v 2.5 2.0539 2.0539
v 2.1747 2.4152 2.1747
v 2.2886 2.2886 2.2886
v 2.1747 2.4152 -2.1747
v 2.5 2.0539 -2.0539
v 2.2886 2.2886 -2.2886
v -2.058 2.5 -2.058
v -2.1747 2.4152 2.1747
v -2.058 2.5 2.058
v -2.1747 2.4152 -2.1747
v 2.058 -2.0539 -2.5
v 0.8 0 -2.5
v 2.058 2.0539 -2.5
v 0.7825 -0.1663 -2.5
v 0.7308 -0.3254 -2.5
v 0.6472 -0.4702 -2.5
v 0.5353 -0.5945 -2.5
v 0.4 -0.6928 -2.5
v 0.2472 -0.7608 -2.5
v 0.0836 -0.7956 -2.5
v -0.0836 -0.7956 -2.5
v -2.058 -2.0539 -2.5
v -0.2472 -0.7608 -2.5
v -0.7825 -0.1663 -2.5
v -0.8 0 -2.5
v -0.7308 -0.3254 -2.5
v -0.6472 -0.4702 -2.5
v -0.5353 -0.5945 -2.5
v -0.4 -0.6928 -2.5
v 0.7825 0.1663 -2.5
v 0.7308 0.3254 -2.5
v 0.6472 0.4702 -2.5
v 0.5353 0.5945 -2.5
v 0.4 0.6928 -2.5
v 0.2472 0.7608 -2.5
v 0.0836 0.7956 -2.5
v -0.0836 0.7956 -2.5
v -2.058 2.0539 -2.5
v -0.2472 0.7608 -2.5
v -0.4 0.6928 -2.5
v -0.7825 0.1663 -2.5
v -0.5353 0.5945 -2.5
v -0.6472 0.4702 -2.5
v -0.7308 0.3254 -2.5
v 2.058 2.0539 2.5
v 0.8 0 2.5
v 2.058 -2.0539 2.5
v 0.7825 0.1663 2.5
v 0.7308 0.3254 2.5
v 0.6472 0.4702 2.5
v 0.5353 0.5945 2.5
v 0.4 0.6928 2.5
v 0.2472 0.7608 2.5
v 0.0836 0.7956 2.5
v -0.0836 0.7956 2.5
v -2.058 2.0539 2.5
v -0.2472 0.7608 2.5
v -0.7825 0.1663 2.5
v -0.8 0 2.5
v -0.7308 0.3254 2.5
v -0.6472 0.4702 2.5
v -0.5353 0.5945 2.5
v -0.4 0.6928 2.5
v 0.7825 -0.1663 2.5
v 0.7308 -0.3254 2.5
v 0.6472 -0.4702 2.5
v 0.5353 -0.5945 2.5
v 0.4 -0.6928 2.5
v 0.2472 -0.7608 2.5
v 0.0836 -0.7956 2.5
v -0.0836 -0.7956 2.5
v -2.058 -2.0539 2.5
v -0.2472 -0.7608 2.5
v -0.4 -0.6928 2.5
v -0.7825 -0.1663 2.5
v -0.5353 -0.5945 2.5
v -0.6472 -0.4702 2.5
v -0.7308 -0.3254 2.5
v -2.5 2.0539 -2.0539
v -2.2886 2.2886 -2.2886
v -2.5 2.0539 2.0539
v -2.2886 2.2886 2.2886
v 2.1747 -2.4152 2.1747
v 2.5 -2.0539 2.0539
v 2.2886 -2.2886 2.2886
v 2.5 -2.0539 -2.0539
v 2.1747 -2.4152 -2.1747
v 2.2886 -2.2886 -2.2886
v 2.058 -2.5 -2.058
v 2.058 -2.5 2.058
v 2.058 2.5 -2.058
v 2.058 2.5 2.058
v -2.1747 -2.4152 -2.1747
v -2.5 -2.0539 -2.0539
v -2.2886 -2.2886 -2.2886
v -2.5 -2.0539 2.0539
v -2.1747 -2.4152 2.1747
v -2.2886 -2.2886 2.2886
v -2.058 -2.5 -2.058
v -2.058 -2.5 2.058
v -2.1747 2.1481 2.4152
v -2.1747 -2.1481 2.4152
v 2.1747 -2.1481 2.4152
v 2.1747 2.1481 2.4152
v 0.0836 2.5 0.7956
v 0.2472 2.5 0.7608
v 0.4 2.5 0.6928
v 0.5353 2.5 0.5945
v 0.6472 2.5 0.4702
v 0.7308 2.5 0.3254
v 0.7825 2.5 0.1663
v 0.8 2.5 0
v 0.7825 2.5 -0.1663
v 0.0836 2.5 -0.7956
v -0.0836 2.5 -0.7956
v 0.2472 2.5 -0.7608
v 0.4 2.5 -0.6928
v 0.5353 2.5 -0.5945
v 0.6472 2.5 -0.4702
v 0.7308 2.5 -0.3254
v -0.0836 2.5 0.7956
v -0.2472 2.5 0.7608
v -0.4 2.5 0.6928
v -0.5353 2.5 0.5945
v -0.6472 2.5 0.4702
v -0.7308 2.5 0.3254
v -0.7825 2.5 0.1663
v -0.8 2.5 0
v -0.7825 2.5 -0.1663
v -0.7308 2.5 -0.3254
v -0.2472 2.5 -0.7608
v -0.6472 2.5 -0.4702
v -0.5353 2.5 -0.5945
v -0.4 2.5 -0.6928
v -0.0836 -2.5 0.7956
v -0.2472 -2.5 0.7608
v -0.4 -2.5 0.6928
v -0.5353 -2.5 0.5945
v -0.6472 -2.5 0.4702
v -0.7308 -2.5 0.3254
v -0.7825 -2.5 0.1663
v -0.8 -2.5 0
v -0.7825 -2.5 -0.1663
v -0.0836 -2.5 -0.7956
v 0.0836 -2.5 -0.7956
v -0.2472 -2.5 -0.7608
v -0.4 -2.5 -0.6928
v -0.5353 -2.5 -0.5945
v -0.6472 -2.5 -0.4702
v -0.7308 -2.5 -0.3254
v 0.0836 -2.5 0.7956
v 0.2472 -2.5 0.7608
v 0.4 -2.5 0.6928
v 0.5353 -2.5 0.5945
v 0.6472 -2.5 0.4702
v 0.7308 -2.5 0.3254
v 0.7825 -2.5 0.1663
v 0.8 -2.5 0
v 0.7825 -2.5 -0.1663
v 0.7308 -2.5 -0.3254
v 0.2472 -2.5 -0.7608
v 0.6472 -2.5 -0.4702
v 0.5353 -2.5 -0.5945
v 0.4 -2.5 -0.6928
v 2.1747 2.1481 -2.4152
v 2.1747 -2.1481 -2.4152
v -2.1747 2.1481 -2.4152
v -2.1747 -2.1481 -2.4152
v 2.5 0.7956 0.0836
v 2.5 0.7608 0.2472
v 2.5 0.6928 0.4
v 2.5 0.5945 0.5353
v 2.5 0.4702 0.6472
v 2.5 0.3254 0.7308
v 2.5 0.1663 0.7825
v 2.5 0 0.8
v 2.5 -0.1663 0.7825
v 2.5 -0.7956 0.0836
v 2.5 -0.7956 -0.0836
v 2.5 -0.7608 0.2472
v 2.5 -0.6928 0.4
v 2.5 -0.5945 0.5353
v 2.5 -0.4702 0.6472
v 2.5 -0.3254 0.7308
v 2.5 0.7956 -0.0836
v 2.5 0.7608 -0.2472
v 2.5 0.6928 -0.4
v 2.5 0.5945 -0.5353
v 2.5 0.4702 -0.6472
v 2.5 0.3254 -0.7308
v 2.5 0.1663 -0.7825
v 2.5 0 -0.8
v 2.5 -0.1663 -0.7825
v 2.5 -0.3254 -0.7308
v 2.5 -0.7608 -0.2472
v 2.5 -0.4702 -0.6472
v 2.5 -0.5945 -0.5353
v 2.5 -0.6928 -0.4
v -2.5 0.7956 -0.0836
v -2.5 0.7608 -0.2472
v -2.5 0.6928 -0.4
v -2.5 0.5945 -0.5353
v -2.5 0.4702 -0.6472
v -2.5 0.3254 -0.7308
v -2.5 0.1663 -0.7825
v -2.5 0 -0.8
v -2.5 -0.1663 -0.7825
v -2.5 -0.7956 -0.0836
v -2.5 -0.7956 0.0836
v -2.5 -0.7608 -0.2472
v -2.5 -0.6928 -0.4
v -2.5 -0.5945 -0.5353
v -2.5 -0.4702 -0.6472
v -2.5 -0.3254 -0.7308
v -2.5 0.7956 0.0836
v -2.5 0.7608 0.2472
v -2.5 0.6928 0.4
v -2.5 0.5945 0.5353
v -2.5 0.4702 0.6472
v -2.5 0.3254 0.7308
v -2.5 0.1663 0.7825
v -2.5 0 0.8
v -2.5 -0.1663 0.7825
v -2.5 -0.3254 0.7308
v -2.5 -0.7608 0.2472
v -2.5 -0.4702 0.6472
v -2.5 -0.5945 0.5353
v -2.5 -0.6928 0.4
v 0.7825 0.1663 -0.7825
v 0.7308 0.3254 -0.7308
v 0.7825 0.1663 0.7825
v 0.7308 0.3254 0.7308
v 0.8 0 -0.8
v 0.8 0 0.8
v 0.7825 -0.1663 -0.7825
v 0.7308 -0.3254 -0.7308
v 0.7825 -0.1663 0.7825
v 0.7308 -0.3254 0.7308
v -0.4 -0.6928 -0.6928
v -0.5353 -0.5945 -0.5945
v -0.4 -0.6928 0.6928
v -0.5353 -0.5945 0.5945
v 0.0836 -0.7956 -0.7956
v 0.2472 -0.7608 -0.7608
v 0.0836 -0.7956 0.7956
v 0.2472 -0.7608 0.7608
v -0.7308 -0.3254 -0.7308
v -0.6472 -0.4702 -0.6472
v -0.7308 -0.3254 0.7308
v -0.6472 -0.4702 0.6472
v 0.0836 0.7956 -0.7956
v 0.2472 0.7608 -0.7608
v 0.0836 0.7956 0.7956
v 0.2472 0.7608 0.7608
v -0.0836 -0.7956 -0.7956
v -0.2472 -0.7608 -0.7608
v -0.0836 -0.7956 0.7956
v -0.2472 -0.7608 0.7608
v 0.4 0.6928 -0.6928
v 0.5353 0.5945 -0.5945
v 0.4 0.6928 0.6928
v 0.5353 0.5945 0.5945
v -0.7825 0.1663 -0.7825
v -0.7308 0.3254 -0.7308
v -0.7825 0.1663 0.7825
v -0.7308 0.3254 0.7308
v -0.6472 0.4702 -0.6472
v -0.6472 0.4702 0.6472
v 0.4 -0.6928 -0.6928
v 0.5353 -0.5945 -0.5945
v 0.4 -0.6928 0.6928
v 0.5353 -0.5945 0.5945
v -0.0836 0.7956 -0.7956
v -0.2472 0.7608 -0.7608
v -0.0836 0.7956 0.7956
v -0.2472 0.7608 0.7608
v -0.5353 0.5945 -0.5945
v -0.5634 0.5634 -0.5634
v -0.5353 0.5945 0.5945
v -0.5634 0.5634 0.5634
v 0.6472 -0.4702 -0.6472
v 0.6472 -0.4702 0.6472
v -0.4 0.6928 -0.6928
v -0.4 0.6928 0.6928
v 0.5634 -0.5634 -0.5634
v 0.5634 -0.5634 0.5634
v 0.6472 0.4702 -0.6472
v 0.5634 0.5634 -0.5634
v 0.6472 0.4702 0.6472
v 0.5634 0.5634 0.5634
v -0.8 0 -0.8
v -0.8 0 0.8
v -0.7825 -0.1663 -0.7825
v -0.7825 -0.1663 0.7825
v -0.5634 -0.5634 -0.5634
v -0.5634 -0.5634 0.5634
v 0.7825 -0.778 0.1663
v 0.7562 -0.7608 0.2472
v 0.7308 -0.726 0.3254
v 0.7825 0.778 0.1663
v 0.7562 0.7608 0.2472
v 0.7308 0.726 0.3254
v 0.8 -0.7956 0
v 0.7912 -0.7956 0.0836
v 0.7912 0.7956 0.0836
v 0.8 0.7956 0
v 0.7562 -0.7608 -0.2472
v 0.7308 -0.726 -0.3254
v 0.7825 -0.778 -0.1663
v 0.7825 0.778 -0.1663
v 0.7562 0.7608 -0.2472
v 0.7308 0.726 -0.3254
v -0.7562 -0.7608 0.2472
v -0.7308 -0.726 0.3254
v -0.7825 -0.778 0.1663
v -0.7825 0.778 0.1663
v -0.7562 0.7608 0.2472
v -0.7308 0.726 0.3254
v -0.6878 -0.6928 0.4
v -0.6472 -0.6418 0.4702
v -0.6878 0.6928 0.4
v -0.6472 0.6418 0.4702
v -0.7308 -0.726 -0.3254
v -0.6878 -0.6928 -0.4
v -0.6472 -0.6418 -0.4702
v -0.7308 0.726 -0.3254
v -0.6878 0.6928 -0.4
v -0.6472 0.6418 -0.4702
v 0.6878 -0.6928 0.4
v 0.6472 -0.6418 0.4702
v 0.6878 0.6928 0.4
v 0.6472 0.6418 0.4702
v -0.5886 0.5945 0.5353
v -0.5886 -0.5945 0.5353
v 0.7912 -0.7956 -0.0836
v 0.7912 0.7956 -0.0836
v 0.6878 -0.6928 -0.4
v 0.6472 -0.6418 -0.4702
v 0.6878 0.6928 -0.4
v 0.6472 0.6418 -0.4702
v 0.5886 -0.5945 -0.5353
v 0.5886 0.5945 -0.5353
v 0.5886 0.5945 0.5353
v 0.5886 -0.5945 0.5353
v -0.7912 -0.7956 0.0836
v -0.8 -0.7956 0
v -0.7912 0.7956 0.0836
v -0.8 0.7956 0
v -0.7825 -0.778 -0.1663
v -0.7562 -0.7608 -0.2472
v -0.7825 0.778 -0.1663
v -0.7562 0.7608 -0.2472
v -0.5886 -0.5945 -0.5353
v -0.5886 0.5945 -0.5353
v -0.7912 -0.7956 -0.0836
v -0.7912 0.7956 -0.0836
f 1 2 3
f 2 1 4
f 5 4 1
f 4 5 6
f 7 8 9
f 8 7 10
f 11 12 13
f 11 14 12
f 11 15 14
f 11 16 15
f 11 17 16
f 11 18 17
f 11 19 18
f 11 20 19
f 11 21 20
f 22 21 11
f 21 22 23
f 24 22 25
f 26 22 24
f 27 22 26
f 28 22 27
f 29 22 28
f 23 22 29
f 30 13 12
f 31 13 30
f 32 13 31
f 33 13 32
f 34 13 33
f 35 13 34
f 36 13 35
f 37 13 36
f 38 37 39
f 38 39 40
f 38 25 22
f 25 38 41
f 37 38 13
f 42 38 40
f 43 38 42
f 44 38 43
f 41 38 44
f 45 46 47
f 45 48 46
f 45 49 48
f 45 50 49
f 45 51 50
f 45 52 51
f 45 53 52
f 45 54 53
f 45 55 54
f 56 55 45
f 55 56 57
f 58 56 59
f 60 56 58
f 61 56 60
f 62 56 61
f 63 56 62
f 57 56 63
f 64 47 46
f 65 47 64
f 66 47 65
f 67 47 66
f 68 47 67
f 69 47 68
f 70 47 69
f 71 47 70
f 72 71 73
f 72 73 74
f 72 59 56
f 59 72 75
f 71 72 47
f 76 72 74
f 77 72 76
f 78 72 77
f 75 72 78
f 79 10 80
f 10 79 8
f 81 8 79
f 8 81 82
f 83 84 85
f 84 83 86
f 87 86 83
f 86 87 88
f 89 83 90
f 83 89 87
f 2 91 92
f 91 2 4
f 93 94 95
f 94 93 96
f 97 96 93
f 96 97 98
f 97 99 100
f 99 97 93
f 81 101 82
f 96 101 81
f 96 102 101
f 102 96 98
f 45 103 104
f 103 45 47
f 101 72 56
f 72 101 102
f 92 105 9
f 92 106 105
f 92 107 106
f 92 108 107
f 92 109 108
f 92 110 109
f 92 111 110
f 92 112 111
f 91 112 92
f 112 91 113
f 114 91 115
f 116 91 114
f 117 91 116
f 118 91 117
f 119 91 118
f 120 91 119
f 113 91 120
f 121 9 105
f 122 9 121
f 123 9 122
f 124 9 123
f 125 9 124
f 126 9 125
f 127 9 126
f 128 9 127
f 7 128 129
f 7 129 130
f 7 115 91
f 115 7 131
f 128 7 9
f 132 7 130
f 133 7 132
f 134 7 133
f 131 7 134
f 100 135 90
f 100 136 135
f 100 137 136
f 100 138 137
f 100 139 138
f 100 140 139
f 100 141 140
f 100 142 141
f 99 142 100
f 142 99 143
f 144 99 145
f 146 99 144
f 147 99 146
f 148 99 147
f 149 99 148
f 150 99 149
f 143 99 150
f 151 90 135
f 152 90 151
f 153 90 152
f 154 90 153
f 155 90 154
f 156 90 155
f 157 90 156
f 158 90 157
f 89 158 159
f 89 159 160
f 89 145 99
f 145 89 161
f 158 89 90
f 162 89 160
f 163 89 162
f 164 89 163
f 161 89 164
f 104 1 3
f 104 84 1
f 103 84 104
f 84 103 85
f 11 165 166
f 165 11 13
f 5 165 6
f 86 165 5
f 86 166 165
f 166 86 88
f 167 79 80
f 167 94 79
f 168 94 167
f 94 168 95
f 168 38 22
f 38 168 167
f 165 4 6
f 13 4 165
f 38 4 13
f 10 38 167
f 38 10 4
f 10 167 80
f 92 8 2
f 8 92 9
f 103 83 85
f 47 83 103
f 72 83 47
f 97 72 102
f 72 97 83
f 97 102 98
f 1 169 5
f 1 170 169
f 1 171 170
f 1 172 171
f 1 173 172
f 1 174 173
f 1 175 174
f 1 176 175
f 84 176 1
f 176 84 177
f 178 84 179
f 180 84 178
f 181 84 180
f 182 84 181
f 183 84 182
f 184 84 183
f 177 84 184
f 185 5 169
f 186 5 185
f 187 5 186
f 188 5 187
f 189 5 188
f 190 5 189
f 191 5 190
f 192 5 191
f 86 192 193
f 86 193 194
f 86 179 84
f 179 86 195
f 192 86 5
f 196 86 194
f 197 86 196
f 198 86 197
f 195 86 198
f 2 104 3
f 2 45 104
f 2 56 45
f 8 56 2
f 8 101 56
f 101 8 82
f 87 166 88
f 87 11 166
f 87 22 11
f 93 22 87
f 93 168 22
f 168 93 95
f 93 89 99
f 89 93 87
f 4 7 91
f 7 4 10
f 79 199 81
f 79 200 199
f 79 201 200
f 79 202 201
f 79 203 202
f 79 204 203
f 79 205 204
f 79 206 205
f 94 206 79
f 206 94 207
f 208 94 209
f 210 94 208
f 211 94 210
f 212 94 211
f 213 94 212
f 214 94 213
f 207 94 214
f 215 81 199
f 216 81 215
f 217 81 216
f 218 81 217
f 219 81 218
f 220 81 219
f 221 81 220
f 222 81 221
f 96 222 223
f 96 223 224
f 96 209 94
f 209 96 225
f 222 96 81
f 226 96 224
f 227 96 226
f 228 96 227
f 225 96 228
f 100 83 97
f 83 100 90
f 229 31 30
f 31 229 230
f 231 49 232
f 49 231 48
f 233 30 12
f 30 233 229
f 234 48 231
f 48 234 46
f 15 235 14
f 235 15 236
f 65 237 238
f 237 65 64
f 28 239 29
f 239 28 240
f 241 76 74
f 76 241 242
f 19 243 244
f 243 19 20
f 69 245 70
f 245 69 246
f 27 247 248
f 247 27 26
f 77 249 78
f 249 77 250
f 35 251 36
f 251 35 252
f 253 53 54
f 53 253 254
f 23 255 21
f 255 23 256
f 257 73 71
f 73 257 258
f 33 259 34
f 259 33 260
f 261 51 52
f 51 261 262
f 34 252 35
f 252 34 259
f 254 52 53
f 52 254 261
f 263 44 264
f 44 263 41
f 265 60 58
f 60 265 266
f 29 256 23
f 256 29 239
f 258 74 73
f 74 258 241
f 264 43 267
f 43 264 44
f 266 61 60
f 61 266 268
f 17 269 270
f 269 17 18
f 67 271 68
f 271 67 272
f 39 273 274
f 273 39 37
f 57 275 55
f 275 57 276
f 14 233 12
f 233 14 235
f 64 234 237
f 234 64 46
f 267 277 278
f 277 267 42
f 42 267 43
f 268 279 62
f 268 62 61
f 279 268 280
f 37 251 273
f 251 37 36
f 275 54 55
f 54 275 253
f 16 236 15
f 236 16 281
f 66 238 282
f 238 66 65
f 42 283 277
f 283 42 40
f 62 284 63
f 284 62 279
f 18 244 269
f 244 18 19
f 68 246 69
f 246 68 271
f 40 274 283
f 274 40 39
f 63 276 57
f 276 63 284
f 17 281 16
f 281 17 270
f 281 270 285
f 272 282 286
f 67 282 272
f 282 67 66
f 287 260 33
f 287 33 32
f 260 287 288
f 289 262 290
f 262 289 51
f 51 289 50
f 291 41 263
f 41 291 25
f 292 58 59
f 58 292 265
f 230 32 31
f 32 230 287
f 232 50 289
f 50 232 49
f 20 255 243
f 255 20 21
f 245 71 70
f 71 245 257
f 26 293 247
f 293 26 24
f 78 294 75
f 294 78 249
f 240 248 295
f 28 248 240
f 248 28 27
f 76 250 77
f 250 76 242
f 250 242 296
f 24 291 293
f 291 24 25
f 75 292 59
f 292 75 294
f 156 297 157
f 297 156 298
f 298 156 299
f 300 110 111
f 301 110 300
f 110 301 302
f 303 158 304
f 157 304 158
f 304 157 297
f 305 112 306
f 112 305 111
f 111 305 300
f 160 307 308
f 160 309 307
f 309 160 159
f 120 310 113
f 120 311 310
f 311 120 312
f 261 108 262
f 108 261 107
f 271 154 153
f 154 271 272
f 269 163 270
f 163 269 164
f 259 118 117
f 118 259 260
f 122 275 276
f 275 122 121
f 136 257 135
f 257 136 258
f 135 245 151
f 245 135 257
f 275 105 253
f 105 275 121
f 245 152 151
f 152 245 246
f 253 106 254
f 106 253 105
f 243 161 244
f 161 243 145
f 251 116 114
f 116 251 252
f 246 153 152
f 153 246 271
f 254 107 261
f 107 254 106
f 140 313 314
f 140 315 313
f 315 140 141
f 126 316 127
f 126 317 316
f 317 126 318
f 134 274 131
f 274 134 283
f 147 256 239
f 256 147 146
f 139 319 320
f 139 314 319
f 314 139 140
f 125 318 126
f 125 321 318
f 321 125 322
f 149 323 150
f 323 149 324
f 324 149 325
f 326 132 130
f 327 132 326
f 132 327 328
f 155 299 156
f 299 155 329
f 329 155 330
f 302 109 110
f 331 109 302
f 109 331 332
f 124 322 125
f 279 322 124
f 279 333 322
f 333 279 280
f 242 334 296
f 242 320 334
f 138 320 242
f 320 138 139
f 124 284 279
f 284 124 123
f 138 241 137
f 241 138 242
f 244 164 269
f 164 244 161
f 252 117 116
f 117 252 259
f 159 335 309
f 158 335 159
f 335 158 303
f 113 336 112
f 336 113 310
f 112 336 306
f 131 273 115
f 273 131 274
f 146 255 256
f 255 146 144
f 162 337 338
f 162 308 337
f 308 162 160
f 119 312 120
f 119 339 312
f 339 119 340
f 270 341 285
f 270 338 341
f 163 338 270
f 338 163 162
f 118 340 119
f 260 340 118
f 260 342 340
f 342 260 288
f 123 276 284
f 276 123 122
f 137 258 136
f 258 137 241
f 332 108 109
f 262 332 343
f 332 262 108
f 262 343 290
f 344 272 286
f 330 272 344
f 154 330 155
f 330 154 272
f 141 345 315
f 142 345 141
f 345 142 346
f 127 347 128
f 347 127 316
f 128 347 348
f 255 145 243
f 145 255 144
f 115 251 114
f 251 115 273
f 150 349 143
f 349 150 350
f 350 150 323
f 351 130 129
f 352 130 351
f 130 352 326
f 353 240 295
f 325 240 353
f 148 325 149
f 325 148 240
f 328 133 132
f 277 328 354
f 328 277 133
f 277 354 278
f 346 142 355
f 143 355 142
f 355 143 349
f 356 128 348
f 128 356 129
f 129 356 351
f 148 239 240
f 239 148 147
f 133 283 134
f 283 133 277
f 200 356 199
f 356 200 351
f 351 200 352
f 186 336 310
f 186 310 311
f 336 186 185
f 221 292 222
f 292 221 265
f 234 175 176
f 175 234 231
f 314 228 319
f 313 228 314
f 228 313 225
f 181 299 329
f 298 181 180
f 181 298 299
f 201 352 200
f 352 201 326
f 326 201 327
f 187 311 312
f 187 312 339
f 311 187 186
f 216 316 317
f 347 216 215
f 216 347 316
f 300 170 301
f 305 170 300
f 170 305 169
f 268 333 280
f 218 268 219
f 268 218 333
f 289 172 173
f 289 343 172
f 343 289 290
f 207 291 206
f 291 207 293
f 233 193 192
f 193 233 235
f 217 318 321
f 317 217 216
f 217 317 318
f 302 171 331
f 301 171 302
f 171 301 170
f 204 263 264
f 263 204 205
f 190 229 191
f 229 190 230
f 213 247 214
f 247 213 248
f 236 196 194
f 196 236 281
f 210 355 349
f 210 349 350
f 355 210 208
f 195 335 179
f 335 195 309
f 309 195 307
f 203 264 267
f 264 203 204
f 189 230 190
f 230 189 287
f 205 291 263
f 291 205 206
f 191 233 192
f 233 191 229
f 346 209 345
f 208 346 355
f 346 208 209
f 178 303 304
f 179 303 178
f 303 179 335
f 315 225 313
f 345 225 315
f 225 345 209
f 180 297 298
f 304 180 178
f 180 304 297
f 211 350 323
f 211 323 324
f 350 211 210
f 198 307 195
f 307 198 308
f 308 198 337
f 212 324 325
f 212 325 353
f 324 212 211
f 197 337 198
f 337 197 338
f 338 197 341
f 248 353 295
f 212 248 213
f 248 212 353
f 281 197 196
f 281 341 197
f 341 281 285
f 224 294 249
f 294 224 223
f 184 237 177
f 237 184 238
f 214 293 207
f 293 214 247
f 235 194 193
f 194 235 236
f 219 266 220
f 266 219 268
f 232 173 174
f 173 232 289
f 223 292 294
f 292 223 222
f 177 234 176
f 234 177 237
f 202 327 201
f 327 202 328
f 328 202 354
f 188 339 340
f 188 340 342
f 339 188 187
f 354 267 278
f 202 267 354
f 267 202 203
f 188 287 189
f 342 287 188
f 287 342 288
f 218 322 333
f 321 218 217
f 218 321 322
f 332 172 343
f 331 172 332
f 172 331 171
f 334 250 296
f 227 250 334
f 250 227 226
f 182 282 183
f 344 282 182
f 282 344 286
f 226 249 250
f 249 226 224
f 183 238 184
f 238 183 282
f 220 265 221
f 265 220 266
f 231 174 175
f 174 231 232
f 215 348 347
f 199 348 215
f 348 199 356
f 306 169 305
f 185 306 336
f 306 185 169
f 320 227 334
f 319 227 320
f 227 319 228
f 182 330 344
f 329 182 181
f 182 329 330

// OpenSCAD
$fn =30;
side =5;
module peghole(){
    color("Blue")cylinder (6, .8, .8, true);
}
// the peg hole template, a change in size here changes hole everywhere
module peg(){
    cylinder (2, .8, .8);
}

module edge(){
cylinder (side, 3.25, 3.25, true);
}
// a cylinder for making block


module block(){
    intersection(){
edge();
rotate([90,0,0]) edge();
rotate([0, 90, 0]) edge();
}
}
// create the base cube without the holes


module blox(){
difference(){ 
block();
   peghole();
rotate ([90, 0, 0]) peghole();
rotate ([0, 90, 0]) peghole();
}
}
//unembeleshed blox cube
blox();
module cross(){
blox();
translate([side,0,0]) blox();
translate([-side,0,0]) blox();
translate([0,0,side]) blox();
translate([0,0,-side]) blox();
}
// central blox cross
// no longer used
module corner(){difference(){
    block();
   translate([-3,-3,3])rotate([0,45,0])
cube([8,6
   ,4]) color("Red");
 rotate([0,90,0])
   translate([0,0,-4]) peghole();
 translate([0,0,-4]) peghole();   
 rotate([0,45,0]) translate([0,0,1])peghole();   
}
}
    
//anled blox piece

module side(){
    blox();
    translate([0,0,5])corner();
translate([0,0,-5]) rotate([0,90,0]) corner();
}
// Pentagram side of octagon, can be own piece

module 3long() {
    blox();
    translate([0,0,5]) blox();
    translate([0,0,-5]) blox();
}

module opcorner(){
    translate([5,0,5]) corner();
translate([-5,0,-5]) rotate([0,180,0])corner();
}
// unused now

module oct() {
3long();
translate([5,0,0]) side();
translate([-5,0,0]) rotate([0,180,0]) side();
}
// one octagon of blox, can be used as own piece

module longside() {
side();
translate([0,5,0]) side();
translate([0,-5,0]) side();
}
// long side can be used as own piece

module hexlong(){
longside();
translate([-5,0,0]) rotate([0,180,0]) longside();
}
// long side in the combined form, usable as piece

module 3X3() {
3long();
translate([0,5,0]) 3long();
translate([0,-5,0]) 3long();
}
// plate of 3X3 blox can be used as own piece

module long(){
    oct();
translate([0,5,0]) oct();
translate([0,-5,0]) oct();
}
// octoganal tube with solid fill

module longhollow(){
difference(){
long();
cube([10,10,5], true);
cube([5,10,10], true);
}
}
// lighter octoganal tube

module test(){
translate([0,0,10]) blox();
rotate([0,45,0]) translate([0,0,9.5]) blox();
}
// set up angle for bracket design
module core() {
    color("Red") translate([0,0,2.5]) blox();
    color("Red");
}
// a test blox to position in cap
module caplower(){
CapPoints = [ [0,7.5,0],[5,2.5,0],[5,-2.5,0],[0,-7.5,0],[0,2.35,4.6],[2.35,2.35,4.6],[2.35,-2.35,4.6],[0,-2.35,4.6] ];
CapFaces = [ [0,1,2,3],[1,0,5],[3,2,6],[3,6,7],[3,7,4,0],[2,1,5,6],[5,4,7,6],[4,5,0] ];
polyhedron(CapPoints, CapFaces,convexity = 1);
}
// creates a cap with a petruding blox, needs finetuning
module halfflatcap() {
    CapPoints = [ [0,7.5,0],[5,2.5,0],[5,-2.5,0],[0,-7.5,0],[0,2.5,5],[2.5,2.5,5],[2.5,-2.5,5],[0,-2.5,5] ];
CapFaces = [ [3,2,1,0],[5,0,1],[6,2,3],[7,6,3],[0,4,7,3],[6,5,1,2],[6,7,4,5],[0,5,4] ];
difference(){
    polyhedron(CapPoints, CapFaces,convexity = 1);
translate([2.5,0,-1]) peghole();
translate([0,0,4]) peghole();
}
}
// make half a cao for hex with sides flush with top of blox
module fulflatcap() {
    halfflatcap();
rotate ([0,0,180]) halfflatcap();
}

// make cap for hex with sides flush with top of blox
//difference(){
module wingspots(){
    rotate([0,-90,0]) side();
translate([0,0,-5])
union(){
   test();
rotate([0,0,180]) test();

}
}
// test of wing spots,
//why does diference with core not work

module test2() {
difference(){
    wingspots();
translate([0,0,5
   ]) cube(5.005
   ,true);
    //messing with a hairs breadth as blox() ads a tiny hight change
}
//blox();
}
// test for bracket between octagon angles
module bracketendb(){
cylinder(1,1.25,1.25);
translate([0,-1.25,0]) cube([2,2.5,1]);
    peg();
}
module bracketpegs() {
    translate([-4.5,0,2]) rotate ([180,45,0]) bracketendb();
translate([4.5,0,2]) rotate ([0,135,0]) bracketendb();
translate([0,0,.5]) cube([7,2.5,1], true);
translate([0,0,-2]) peg();
}
module acutebracket() { 
     translate([-1,,-1.25,-2])rotate([0,45,0]) cube([1,2.5,1]);
    rotate([0,90,180]) bracketendb();
translate([.75,0,-.75]) rotate([0,135,0])  bracketendb();
}
//bracket for flat to angled wings
module hexwings() {
    translate([0,0,2.5]) wingspots();
rotate([0,180,0]) translate([0,0,2.5]) wingspots();
}
//test rig for hexbody wing placement
module smallrightbrace() {
    translate([-1.7,0,1.7]) rotate([0,135,180]) bracketendb();
translate([1.7,0,1.7])rotate([180,45,180]) bracketendb();
translate([0,0,.3]) cube([2,2.5,1], true);
}
// bracket for angled wings on hex body
//some trimming could be done
